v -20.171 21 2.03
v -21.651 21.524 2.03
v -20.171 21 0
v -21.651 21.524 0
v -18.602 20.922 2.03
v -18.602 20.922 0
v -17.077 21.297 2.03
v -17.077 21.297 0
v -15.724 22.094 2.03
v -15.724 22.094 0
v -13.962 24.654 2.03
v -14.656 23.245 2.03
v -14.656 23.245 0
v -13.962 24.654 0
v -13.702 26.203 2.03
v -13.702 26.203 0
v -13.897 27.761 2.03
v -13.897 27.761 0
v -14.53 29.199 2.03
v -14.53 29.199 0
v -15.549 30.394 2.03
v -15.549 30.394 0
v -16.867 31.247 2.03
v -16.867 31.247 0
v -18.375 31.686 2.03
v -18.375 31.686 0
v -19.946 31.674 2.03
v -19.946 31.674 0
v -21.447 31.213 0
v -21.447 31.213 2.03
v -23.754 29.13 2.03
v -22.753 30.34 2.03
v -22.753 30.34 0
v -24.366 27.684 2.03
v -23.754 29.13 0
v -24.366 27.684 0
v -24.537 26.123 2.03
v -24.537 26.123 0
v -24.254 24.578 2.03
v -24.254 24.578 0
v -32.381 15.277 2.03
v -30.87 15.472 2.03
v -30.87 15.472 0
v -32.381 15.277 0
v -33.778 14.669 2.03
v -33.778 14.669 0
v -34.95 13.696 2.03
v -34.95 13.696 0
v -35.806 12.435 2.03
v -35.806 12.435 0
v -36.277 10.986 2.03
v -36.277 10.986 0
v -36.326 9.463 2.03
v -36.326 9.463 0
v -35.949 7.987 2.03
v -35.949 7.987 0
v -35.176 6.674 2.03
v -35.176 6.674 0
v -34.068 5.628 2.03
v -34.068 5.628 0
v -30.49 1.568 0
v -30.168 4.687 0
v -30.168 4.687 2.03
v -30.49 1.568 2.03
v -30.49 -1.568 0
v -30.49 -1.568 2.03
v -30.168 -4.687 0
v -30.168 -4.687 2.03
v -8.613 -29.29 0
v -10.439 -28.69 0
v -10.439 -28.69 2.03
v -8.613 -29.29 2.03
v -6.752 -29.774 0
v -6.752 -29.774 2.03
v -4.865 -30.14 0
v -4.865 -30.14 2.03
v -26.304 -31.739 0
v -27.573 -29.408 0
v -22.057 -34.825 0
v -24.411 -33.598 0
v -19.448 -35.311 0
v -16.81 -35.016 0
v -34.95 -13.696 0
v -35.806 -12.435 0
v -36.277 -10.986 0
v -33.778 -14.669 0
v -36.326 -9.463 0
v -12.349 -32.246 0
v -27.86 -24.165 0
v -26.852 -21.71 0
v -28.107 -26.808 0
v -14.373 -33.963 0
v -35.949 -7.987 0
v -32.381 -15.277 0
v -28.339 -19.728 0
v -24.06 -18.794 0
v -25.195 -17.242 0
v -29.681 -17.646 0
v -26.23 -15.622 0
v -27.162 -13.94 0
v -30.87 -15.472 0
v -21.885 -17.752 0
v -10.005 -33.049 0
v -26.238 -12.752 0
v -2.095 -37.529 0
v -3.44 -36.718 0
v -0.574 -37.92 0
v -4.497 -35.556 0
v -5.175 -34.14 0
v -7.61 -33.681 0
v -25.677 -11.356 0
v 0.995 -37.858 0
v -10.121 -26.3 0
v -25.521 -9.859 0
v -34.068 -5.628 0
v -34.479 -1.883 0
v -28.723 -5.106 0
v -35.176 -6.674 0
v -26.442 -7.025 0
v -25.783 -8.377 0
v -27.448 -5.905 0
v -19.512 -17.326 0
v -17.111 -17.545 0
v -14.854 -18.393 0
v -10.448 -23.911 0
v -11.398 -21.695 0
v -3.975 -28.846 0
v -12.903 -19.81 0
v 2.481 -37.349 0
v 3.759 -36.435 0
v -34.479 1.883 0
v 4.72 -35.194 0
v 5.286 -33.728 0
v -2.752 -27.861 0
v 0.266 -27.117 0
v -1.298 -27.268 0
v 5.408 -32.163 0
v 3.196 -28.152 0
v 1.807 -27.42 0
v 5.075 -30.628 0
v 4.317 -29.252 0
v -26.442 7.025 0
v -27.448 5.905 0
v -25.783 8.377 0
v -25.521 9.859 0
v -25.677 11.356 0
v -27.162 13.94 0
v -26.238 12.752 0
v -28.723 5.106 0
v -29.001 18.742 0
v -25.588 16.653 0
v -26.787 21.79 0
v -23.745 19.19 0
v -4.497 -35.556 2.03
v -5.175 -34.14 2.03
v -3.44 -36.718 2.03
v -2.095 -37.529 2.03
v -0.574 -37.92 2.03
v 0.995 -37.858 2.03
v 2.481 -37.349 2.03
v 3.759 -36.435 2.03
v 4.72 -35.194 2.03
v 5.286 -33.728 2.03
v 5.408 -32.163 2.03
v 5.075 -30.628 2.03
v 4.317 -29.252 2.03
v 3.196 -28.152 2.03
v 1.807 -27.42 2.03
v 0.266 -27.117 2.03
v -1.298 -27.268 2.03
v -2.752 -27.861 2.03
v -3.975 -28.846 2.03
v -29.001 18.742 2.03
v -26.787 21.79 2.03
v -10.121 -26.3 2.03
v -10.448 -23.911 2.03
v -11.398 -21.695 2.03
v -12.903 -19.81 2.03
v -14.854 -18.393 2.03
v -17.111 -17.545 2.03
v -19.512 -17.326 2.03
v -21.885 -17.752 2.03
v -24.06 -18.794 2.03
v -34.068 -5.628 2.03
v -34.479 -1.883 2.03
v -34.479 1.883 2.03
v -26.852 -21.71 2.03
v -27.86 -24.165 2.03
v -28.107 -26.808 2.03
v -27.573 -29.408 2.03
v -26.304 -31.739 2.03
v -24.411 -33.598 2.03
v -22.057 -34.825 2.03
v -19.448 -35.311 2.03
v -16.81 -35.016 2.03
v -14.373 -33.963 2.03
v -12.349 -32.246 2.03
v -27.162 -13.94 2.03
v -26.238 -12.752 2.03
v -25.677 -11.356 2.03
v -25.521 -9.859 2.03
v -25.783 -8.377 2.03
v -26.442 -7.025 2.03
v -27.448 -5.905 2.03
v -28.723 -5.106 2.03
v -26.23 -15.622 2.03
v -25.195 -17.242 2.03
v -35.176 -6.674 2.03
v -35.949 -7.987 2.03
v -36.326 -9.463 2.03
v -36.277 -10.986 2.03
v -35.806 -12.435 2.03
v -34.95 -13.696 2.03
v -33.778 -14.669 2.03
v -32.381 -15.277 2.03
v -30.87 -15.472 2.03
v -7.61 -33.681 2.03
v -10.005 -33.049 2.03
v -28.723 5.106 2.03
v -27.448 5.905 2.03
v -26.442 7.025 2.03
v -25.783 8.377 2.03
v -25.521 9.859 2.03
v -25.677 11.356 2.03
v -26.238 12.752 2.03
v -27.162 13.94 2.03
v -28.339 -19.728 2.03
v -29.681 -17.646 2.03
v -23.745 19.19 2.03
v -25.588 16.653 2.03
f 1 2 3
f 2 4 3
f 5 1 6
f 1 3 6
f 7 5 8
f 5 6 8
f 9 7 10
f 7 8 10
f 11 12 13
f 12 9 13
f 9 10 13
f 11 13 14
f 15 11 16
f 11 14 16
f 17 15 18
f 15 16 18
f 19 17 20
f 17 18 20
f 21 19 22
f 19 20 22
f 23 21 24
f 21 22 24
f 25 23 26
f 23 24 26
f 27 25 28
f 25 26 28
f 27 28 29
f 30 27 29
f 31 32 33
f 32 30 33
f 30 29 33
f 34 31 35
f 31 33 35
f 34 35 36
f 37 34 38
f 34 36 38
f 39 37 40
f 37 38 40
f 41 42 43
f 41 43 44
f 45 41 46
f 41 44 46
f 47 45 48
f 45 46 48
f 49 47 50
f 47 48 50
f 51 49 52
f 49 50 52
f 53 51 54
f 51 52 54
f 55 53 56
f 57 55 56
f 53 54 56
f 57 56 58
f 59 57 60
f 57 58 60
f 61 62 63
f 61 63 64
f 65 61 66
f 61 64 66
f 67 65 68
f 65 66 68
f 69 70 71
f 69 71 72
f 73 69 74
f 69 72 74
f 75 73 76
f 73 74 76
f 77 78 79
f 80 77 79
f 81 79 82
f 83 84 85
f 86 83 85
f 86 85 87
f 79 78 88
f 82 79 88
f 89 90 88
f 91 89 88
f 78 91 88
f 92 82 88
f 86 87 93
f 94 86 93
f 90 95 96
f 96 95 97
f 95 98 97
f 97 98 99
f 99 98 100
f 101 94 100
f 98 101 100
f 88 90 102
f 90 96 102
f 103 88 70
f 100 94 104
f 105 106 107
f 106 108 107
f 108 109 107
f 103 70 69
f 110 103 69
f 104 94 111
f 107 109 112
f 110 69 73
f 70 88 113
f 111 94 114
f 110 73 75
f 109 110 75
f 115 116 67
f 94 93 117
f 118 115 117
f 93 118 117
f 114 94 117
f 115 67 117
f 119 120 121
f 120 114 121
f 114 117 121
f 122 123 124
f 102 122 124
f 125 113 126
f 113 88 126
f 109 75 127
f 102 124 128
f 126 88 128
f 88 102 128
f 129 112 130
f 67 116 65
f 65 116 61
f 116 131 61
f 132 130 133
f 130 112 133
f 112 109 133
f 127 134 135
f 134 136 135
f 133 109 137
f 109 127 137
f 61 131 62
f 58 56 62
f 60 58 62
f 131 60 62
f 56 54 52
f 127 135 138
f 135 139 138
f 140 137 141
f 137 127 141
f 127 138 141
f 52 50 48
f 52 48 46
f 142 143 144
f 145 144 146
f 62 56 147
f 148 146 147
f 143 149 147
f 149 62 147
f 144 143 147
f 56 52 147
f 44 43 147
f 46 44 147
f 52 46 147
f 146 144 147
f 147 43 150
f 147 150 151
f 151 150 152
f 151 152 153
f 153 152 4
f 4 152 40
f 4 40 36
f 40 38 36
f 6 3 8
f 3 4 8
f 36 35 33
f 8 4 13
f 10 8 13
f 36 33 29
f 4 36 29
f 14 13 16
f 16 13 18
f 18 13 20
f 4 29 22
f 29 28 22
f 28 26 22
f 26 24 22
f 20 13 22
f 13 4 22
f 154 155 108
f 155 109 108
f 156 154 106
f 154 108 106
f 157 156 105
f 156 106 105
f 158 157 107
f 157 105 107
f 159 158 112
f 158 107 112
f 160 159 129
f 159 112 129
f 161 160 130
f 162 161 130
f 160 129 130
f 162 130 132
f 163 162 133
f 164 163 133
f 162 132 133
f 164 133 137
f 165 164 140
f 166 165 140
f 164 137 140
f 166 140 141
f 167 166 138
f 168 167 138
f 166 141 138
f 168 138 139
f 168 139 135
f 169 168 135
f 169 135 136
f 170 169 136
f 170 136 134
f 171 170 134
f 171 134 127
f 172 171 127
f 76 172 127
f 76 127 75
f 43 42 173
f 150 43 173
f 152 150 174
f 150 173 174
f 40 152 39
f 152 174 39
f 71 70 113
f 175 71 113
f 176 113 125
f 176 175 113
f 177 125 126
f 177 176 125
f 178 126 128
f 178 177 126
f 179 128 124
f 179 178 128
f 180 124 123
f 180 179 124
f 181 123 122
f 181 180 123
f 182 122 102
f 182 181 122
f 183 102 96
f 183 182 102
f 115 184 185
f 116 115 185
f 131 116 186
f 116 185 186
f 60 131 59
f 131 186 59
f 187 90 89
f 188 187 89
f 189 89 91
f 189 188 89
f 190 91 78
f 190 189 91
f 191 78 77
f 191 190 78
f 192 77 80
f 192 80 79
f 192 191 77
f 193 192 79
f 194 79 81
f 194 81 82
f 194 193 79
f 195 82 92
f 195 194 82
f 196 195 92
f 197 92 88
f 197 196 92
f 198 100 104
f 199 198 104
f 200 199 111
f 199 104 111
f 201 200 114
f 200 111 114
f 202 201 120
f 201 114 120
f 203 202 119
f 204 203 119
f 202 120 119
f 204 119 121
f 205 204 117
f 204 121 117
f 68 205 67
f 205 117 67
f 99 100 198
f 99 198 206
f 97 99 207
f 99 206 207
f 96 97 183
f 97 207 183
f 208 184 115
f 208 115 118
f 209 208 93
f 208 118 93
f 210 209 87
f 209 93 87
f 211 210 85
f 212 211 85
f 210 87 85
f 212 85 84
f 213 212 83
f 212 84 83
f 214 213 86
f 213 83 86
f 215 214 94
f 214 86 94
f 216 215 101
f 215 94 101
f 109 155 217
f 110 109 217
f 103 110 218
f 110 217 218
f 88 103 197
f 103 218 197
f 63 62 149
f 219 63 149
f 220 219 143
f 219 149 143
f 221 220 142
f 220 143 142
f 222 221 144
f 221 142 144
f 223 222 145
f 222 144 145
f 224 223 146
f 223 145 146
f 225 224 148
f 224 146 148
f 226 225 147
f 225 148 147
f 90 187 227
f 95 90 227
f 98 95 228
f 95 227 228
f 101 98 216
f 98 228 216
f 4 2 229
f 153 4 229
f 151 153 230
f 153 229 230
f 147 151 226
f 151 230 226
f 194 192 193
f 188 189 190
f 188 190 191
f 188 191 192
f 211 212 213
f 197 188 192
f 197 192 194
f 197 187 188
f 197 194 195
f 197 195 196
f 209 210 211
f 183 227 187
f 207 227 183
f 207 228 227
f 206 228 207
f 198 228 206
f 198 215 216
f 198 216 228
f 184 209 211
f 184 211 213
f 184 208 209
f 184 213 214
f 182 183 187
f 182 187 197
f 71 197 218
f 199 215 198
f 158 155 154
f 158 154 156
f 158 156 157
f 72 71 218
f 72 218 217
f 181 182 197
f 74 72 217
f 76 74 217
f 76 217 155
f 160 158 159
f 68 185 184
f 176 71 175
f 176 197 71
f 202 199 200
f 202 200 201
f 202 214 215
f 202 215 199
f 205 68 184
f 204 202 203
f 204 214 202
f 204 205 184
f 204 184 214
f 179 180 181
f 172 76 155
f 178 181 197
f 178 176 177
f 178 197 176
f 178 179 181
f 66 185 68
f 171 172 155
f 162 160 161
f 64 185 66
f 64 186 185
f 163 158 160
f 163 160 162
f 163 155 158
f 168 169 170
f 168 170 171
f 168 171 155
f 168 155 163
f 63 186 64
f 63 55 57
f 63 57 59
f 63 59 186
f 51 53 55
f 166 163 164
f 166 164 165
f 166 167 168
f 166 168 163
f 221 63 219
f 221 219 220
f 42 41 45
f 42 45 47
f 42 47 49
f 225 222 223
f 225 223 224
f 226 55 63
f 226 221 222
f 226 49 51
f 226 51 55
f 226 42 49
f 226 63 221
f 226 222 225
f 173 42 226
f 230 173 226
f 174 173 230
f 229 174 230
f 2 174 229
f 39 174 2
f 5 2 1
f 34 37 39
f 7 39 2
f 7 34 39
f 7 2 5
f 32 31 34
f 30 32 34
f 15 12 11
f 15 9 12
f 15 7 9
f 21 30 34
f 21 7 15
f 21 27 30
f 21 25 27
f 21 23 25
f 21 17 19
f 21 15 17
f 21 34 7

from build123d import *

# Parameters (mm, degrees)
SKETCH1_R             = 5.42
BOSS_EXTRUDE1_DEPTH   = 2.03
BOSS_EXTRUDE1_2_DEPTH = 2.03
BOSS_EXTRUDE1_3_DEPTH = 2.03
BOSS_EXTRUDE1_4_DEPTH = 2.03
BOSS_EXTRUDE1_5_DEPTH = 2.03
BOSS_EXTRUDE2_DEPTH   = 2.03
SKETCH3_R             = 9
BOSS_EXTRUDE3_DEPTH   = 2.03


with BuildPart() as part:
    # Sketch1 → Boss-Extrude1 (new body)
    with BuildSketch(Plane.XY):
        with Locations((0, -32.53)):
            Circle(SKETCH1_R)
    extrude(amount=BOSS_EXTRUDE1_DEPTH)



with BuildPart() as body_2:
    # Sketch1 → Boss-Extrude1 2 (new body)
    with BuildSketch(Plane.XY):
        with Locations((-19.120654257, -26.317322827)):
            Circle(SKETCH1_R)
    extrude(amount=BOSS_EXTRUDE1_2_DEPTH)


with BuildPart() as body_3:
    # Sketch1 → Boss-Extrude1 3 (new body)
    with BuildSketch(Plane.XY):
        with Locations((-30.937868475, -10.052322827)):
            Circle(SKETCH1_R)
    extrude(amount=BOSS_EXTRUDE1_3_DEPTH)


with BuildPart() as body_4:
    # Sketch1 → Boss-Extrude1 4 (new body)
    with BuildSketch(Plane.XY):
        with Locations((-30.937868475, 10.052322827)):
            Circle(SKETCH1_R)
    extrude(amount=BOSS_EXTRUDE1_4_DEPTH)


with BuildPart() as body_5:
    # Sketch1 → Boss-Extrude1 5 (new body)
    with BuildSketch(Plane.XY):
        with Locations((-19.120654257, 26.317322827)):
            Circle(SKETCH1_R)
    extrude(amount=BOSS_EXTRUDE1_5_DEPTH)


with BuildPart() as part_1:
    add(part.part)

    add(body_2.part)  # Boss-Extrude2 merges body 2

    add(body_3.part)  # Boss-Extrude2 merges body 3

    add(body_4.part)  # Boss-Extrude2 merges body 4

    add(body_5.part)  # Boss-Extrude2 merges body 5
    # Sketch2 → Boss-Extrude2 (add)
    with BuildSketch(Plane.XY.offset(2.03)):
        with BuildLine():
            Line((-20.296224762, 27.935356816), (-17.945083752, 24.699288838))
            ThreePointArc((-17.945083752, 24.699288838), (-29.035755442, -9.434288838), (0, -30.53))
            Line((0, -30.53), (0, -34.53))
            ThreePointArc((0, -34.53), (-32.839981508, -10.670356816), (-20.296224762, 27.935356816))
        make_face()
    extrude(amount=-BOSS_EXTRUDE2_DEPTH)

    # Sketch3 → Boss-Extrude3 (add)
    with BuildSketch(Plane.XY.offset(2.03)):
        with Locations((-19.120654257, -26.317322827)):
            Circle(SKETCH3_R)
    extrude(amount=-BOSS_EXTRUDE3_DEPTH)


solid = part_1.part
